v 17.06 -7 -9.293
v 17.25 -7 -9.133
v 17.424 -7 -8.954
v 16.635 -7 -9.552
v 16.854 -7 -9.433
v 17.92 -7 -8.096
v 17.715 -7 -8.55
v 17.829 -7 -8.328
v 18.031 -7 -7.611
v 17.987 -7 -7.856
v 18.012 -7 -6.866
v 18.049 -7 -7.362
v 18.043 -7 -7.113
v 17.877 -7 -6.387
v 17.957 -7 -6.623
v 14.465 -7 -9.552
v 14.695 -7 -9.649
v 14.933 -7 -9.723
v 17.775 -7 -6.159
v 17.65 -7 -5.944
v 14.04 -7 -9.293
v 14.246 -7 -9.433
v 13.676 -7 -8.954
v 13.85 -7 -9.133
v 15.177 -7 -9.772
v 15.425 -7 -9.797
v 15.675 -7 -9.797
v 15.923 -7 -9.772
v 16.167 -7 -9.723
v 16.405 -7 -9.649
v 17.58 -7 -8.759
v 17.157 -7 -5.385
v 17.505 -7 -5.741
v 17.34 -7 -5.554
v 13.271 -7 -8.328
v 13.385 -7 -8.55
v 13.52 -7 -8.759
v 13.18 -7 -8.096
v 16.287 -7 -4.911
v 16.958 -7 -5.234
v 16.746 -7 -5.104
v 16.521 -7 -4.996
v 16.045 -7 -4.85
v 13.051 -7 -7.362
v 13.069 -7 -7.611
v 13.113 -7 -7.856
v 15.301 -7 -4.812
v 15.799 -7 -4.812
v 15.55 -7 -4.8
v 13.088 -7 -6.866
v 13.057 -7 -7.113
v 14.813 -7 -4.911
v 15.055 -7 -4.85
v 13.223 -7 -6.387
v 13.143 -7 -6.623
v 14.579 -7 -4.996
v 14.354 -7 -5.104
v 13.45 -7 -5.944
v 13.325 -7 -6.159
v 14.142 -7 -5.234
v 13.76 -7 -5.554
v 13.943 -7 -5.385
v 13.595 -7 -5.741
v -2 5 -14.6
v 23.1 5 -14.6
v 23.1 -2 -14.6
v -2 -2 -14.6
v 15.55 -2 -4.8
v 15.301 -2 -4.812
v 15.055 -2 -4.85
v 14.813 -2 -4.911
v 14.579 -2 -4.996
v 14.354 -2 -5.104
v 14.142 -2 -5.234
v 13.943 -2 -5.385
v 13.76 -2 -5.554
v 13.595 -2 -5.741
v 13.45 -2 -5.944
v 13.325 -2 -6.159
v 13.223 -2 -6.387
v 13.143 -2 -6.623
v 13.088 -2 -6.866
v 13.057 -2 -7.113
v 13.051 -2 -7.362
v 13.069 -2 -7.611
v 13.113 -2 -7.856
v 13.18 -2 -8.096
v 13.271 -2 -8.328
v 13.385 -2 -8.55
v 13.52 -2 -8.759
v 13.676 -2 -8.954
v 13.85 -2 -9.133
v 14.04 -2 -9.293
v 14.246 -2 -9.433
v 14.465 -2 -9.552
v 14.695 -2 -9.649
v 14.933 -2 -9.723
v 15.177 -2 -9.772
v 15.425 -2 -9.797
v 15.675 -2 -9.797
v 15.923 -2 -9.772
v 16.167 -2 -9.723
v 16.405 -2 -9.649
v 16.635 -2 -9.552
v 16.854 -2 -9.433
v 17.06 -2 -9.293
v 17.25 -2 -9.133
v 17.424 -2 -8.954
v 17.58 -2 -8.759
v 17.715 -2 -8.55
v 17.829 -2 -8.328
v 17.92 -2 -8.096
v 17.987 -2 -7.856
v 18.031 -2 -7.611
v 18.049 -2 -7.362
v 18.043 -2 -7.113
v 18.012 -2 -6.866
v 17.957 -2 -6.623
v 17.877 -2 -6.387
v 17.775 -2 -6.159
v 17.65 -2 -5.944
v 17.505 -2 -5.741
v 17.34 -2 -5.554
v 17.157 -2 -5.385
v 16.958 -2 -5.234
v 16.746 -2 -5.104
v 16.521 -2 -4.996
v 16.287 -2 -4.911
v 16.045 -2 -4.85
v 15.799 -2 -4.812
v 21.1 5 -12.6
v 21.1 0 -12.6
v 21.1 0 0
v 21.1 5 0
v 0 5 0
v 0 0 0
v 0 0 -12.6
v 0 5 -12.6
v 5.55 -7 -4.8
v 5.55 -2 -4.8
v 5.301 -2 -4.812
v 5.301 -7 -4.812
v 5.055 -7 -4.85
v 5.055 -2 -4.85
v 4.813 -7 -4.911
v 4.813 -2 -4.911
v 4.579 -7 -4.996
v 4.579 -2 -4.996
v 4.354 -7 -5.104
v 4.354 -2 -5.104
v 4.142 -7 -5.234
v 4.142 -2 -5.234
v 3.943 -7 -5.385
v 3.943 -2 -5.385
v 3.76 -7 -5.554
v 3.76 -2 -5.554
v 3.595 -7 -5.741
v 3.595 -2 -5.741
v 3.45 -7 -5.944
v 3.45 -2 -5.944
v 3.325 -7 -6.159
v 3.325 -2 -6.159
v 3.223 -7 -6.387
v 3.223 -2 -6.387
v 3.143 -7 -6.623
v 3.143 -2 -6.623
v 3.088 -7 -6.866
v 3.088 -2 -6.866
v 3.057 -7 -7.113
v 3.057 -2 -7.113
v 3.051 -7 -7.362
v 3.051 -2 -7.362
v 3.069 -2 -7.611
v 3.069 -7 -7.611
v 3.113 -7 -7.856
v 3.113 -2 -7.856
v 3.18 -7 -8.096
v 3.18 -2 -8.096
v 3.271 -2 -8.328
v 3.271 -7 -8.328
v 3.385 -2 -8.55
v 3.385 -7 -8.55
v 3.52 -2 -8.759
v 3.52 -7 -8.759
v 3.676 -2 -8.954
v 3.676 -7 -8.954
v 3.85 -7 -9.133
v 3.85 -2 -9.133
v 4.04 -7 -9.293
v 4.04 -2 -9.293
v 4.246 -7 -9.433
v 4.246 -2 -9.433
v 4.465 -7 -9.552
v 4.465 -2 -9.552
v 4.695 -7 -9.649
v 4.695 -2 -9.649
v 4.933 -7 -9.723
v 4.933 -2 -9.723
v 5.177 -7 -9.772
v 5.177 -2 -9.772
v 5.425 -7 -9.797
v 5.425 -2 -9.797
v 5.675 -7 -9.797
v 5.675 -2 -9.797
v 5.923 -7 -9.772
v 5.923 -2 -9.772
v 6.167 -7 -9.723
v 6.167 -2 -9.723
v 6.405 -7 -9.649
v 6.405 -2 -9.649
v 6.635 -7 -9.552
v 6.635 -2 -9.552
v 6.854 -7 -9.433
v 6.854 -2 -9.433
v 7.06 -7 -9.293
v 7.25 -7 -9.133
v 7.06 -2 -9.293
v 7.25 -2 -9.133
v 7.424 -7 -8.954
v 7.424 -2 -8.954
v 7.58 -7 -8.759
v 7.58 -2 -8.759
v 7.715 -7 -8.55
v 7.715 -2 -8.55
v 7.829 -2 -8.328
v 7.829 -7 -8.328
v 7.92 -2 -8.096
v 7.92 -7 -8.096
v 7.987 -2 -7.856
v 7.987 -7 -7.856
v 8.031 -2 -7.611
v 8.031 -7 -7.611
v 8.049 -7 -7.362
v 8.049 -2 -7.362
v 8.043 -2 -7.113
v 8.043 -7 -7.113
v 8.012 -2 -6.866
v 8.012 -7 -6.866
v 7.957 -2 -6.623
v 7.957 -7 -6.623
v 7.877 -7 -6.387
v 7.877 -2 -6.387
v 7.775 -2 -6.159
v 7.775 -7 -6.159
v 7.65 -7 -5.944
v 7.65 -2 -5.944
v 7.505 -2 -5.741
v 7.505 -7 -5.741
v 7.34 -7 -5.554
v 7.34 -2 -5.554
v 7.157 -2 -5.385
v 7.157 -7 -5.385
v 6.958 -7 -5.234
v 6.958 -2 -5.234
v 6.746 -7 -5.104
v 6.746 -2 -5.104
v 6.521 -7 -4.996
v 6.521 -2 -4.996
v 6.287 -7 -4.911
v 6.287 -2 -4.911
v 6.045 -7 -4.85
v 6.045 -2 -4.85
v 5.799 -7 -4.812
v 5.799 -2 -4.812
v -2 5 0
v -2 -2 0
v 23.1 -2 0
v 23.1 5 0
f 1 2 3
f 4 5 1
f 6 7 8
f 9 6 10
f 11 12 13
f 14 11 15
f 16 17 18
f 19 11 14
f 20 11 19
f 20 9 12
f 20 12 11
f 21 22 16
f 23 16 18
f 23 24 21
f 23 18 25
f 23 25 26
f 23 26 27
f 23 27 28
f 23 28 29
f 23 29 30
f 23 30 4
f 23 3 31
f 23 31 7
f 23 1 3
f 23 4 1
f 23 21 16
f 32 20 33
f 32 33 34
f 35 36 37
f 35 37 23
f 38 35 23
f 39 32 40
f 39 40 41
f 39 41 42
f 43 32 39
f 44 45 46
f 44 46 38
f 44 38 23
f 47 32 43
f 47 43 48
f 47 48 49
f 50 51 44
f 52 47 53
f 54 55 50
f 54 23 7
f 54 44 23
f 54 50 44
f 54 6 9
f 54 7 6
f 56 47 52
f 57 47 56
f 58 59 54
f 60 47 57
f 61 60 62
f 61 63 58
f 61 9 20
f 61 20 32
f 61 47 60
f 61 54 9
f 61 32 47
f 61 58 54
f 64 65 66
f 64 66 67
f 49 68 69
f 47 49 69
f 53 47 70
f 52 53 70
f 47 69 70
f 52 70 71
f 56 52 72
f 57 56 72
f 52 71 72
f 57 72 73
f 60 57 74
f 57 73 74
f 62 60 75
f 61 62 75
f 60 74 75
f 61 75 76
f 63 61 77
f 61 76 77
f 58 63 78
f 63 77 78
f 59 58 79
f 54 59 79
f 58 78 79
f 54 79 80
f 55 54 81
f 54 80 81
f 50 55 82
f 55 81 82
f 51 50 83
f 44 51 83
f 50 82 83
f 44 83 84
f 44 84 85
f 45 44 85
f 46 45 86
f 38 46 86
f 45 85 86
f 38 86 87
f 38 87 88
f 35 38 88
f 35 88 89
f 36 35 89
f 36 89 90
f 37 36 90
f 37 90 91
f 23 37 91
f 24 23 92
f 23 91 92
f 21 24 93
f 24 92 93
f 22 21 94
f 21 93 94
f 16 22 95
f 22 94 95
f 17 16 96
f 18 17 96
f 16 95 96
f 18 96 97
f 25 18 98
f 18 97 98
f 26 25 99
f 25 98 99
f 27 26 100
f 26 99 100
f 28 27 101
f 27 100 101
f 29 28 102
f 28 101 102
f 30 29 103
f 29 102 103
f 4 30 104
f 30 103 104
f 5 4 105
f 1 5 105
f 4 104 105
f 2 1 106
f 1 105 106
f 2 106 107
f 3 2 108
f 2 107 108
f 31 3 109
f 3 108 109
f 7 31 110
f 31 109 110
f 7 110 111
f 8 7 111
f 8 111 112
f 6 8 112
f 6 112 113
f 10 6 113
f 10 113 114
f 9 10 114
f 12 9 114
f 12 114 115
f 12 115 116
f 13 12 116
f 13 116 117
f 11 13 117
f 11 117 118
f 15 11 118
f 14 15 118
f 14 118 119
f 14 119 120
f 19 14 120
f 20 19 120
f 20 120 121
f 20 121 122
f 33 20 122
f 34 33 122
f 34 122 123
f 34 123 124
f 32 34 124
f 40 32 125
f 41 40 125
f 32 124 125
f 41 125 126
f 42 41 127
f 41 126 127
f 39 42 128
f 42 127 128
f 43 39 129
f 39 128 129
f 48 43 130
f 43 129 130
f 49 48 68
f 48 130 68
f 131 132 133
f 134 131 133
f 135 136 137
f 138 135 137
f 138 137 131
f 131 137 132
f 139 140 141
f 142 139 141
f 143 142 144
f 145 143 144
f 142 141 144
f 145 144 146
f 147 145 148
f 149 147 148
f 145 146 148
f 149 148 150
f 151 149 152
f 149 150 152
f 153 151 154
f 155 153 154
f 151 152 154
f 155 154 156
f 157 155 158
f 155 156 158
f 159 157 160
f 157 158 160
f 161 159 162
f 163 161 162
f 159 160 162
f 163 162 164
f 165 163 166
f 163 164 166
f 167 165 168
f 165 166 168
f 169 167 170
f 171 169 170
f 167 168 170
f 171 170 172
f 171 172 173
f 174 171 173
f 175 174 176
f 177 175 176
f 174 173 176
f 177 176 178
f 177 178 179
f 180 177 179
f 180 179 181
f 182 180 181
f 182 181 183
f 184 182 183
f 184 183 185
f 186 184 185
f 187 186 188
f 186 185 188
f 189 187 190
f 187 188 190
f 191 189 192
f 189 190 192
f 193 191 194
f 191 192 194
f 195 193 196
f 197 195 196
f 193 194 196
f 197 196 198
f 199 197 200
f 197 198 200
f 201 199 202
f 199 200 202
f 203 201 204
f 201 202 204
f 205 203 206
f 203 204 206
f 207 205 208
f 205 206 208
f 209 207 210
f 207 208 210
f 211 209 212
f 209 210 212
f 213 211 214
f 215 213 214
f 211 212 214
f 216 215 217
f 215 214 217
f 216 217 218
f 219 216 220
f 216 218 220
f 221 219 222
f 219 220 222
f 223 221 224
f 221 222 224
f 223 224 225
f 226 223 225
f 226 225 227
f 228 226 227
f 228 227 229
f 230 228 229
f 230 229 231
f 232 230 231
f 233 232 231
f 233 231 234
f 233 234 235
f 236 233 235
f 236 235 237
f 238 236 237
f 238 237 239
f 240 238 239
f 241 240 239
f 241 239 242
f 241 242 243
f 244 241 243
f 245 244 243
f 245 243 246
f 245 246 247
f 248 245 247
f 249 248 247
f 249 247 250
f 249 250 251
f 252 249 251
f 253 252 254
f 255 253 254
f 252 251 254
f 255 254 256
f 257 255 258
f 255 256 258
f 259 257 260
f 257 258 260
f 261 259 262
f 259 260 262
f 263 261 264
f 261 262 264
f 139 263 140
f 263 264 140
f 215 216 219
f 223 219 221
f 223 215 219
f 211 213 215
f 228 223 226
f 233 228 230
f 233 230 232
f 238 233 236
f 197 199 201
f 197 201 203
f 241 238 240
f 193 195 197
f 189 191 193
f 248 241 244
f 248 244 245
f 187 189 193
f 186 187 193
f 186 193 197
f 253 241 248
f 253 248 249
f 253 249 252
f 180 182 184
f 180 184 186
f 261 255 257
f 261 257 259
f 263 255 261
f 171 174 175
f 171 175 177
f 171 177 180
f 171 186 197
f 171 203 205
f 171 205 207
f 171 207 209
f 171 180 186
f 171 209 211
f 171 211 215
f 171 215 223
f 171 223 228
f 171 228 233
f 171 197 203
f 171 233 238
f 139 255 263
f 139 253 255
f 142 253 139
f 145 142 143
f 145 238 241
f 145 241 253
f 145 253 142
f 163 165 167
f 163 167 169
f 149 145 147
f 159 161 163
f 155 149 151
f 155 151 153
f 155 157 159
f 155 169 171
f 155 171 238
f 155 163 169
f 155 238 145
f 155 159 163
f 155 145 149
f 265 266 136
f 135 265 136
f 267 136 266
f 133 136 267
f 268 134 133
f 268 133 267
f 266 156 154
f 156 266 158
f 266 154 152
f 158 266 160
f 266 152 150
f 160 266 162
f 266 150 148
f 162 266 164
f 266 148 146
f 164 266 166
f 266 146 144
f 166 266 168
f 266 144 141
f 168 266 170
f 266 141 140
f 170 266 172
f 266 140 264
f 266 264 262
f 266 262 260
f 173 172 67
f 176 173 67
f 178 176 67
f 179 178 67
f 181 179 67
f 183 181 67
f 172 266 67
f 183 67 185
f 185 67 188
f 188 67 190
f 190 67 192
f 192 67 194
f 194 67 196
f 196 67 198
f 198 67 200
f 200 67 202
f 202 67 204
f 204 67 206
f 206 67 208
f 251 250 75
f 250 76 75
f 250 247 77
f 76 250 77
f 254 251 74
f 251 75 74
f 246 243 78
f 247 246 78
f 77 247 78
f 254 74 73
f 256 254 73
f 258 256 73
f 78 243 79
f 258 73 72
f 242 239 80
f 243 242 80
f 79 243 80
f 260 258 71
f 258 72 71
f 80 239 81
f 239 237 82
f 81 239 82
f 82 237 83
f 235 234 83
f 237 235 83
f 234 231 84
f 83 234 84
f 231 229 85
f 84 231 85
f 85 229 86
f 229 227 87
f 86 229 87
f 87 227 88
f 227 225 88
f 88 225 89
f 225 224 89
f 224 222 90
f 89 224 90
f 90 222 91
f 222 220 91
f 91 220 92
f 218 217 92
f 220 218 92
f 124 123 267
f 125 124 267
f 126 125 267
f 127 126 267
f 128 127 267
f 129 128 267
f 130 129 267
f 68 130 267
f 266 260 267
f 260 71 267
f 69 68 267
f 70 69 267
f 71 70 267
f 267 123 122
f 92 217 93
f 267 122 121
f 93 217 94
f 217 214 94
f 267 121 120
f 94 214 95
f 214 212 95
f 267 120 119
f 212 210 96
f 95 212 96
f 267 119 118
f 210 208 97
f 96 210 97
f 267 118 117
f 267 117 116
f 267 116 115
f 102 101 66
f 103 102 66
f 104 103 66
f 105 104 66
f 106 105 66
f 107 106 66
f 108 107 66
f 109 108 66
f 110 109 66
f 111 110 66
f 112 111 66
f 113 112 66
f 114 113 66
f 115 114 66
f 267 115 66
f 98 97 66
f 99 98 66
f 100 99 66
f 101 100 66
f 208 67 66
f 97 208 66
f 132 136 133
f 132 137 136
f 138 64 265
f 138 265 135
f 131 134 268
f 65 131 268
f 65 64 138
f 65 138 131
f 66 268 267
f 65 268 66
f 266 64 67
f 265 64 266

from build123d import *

# Parameters (mm, degrees)
BOSS_EXTRUDE1_DEPTH = 5
SKETCH1_3_W         = 25.1
SKETCH1_3_H         = 14.6
BOSS_EXTRUDE2_DEPTH = 2
SKETCH3_R           = 2.5
BOSS_EXTRUDE4_DEPTH = 5


with BuildPart() as part:
    # Sketch1 → Boss-Extrude1 (new body)
    with BuildSketch(Plane(origin=(0, 0, 0), x_dir=(1, 0, 0), z_dir=(0, 1, 0))):
        Polygon((23.1, 14.6), (-2, 14.6), (-2, 0), (0, 0), (0, 12.6), (21.1, 12.6), (21.1, 0), (23.1, 0), align=None)
    extrude(amount=BOSS_EXTRUDE1_DEPTH)

    # Sketch1<3> → Boss-Extrude2 (add)
    with BuildSketch(Plane(origin=(0, 0, 0), x_dir=(1, 0, 0), z_dir=(0, 1, 0))):
        with Locations((10.55, 7.3)):
            Rectangle(SKETCH1_3_W, SKETCH1_3_H)
    extrude(amount=-BOSS_EXTRUDE2_DEPTH)

    # Sketch3 → Boss-Extrude4 (add)
    with BuildSketch(Plane.XZ.offset(2)):
        with Locations((5.55, -7.3)):
            Circle(SKETCH3_R)
        with Locations((15.55, -7.3)):
            Circle(SKETCH3_R)
    extrude(amount=BOSS_EXTRUDE4_DEPTH)


solid = part.part
